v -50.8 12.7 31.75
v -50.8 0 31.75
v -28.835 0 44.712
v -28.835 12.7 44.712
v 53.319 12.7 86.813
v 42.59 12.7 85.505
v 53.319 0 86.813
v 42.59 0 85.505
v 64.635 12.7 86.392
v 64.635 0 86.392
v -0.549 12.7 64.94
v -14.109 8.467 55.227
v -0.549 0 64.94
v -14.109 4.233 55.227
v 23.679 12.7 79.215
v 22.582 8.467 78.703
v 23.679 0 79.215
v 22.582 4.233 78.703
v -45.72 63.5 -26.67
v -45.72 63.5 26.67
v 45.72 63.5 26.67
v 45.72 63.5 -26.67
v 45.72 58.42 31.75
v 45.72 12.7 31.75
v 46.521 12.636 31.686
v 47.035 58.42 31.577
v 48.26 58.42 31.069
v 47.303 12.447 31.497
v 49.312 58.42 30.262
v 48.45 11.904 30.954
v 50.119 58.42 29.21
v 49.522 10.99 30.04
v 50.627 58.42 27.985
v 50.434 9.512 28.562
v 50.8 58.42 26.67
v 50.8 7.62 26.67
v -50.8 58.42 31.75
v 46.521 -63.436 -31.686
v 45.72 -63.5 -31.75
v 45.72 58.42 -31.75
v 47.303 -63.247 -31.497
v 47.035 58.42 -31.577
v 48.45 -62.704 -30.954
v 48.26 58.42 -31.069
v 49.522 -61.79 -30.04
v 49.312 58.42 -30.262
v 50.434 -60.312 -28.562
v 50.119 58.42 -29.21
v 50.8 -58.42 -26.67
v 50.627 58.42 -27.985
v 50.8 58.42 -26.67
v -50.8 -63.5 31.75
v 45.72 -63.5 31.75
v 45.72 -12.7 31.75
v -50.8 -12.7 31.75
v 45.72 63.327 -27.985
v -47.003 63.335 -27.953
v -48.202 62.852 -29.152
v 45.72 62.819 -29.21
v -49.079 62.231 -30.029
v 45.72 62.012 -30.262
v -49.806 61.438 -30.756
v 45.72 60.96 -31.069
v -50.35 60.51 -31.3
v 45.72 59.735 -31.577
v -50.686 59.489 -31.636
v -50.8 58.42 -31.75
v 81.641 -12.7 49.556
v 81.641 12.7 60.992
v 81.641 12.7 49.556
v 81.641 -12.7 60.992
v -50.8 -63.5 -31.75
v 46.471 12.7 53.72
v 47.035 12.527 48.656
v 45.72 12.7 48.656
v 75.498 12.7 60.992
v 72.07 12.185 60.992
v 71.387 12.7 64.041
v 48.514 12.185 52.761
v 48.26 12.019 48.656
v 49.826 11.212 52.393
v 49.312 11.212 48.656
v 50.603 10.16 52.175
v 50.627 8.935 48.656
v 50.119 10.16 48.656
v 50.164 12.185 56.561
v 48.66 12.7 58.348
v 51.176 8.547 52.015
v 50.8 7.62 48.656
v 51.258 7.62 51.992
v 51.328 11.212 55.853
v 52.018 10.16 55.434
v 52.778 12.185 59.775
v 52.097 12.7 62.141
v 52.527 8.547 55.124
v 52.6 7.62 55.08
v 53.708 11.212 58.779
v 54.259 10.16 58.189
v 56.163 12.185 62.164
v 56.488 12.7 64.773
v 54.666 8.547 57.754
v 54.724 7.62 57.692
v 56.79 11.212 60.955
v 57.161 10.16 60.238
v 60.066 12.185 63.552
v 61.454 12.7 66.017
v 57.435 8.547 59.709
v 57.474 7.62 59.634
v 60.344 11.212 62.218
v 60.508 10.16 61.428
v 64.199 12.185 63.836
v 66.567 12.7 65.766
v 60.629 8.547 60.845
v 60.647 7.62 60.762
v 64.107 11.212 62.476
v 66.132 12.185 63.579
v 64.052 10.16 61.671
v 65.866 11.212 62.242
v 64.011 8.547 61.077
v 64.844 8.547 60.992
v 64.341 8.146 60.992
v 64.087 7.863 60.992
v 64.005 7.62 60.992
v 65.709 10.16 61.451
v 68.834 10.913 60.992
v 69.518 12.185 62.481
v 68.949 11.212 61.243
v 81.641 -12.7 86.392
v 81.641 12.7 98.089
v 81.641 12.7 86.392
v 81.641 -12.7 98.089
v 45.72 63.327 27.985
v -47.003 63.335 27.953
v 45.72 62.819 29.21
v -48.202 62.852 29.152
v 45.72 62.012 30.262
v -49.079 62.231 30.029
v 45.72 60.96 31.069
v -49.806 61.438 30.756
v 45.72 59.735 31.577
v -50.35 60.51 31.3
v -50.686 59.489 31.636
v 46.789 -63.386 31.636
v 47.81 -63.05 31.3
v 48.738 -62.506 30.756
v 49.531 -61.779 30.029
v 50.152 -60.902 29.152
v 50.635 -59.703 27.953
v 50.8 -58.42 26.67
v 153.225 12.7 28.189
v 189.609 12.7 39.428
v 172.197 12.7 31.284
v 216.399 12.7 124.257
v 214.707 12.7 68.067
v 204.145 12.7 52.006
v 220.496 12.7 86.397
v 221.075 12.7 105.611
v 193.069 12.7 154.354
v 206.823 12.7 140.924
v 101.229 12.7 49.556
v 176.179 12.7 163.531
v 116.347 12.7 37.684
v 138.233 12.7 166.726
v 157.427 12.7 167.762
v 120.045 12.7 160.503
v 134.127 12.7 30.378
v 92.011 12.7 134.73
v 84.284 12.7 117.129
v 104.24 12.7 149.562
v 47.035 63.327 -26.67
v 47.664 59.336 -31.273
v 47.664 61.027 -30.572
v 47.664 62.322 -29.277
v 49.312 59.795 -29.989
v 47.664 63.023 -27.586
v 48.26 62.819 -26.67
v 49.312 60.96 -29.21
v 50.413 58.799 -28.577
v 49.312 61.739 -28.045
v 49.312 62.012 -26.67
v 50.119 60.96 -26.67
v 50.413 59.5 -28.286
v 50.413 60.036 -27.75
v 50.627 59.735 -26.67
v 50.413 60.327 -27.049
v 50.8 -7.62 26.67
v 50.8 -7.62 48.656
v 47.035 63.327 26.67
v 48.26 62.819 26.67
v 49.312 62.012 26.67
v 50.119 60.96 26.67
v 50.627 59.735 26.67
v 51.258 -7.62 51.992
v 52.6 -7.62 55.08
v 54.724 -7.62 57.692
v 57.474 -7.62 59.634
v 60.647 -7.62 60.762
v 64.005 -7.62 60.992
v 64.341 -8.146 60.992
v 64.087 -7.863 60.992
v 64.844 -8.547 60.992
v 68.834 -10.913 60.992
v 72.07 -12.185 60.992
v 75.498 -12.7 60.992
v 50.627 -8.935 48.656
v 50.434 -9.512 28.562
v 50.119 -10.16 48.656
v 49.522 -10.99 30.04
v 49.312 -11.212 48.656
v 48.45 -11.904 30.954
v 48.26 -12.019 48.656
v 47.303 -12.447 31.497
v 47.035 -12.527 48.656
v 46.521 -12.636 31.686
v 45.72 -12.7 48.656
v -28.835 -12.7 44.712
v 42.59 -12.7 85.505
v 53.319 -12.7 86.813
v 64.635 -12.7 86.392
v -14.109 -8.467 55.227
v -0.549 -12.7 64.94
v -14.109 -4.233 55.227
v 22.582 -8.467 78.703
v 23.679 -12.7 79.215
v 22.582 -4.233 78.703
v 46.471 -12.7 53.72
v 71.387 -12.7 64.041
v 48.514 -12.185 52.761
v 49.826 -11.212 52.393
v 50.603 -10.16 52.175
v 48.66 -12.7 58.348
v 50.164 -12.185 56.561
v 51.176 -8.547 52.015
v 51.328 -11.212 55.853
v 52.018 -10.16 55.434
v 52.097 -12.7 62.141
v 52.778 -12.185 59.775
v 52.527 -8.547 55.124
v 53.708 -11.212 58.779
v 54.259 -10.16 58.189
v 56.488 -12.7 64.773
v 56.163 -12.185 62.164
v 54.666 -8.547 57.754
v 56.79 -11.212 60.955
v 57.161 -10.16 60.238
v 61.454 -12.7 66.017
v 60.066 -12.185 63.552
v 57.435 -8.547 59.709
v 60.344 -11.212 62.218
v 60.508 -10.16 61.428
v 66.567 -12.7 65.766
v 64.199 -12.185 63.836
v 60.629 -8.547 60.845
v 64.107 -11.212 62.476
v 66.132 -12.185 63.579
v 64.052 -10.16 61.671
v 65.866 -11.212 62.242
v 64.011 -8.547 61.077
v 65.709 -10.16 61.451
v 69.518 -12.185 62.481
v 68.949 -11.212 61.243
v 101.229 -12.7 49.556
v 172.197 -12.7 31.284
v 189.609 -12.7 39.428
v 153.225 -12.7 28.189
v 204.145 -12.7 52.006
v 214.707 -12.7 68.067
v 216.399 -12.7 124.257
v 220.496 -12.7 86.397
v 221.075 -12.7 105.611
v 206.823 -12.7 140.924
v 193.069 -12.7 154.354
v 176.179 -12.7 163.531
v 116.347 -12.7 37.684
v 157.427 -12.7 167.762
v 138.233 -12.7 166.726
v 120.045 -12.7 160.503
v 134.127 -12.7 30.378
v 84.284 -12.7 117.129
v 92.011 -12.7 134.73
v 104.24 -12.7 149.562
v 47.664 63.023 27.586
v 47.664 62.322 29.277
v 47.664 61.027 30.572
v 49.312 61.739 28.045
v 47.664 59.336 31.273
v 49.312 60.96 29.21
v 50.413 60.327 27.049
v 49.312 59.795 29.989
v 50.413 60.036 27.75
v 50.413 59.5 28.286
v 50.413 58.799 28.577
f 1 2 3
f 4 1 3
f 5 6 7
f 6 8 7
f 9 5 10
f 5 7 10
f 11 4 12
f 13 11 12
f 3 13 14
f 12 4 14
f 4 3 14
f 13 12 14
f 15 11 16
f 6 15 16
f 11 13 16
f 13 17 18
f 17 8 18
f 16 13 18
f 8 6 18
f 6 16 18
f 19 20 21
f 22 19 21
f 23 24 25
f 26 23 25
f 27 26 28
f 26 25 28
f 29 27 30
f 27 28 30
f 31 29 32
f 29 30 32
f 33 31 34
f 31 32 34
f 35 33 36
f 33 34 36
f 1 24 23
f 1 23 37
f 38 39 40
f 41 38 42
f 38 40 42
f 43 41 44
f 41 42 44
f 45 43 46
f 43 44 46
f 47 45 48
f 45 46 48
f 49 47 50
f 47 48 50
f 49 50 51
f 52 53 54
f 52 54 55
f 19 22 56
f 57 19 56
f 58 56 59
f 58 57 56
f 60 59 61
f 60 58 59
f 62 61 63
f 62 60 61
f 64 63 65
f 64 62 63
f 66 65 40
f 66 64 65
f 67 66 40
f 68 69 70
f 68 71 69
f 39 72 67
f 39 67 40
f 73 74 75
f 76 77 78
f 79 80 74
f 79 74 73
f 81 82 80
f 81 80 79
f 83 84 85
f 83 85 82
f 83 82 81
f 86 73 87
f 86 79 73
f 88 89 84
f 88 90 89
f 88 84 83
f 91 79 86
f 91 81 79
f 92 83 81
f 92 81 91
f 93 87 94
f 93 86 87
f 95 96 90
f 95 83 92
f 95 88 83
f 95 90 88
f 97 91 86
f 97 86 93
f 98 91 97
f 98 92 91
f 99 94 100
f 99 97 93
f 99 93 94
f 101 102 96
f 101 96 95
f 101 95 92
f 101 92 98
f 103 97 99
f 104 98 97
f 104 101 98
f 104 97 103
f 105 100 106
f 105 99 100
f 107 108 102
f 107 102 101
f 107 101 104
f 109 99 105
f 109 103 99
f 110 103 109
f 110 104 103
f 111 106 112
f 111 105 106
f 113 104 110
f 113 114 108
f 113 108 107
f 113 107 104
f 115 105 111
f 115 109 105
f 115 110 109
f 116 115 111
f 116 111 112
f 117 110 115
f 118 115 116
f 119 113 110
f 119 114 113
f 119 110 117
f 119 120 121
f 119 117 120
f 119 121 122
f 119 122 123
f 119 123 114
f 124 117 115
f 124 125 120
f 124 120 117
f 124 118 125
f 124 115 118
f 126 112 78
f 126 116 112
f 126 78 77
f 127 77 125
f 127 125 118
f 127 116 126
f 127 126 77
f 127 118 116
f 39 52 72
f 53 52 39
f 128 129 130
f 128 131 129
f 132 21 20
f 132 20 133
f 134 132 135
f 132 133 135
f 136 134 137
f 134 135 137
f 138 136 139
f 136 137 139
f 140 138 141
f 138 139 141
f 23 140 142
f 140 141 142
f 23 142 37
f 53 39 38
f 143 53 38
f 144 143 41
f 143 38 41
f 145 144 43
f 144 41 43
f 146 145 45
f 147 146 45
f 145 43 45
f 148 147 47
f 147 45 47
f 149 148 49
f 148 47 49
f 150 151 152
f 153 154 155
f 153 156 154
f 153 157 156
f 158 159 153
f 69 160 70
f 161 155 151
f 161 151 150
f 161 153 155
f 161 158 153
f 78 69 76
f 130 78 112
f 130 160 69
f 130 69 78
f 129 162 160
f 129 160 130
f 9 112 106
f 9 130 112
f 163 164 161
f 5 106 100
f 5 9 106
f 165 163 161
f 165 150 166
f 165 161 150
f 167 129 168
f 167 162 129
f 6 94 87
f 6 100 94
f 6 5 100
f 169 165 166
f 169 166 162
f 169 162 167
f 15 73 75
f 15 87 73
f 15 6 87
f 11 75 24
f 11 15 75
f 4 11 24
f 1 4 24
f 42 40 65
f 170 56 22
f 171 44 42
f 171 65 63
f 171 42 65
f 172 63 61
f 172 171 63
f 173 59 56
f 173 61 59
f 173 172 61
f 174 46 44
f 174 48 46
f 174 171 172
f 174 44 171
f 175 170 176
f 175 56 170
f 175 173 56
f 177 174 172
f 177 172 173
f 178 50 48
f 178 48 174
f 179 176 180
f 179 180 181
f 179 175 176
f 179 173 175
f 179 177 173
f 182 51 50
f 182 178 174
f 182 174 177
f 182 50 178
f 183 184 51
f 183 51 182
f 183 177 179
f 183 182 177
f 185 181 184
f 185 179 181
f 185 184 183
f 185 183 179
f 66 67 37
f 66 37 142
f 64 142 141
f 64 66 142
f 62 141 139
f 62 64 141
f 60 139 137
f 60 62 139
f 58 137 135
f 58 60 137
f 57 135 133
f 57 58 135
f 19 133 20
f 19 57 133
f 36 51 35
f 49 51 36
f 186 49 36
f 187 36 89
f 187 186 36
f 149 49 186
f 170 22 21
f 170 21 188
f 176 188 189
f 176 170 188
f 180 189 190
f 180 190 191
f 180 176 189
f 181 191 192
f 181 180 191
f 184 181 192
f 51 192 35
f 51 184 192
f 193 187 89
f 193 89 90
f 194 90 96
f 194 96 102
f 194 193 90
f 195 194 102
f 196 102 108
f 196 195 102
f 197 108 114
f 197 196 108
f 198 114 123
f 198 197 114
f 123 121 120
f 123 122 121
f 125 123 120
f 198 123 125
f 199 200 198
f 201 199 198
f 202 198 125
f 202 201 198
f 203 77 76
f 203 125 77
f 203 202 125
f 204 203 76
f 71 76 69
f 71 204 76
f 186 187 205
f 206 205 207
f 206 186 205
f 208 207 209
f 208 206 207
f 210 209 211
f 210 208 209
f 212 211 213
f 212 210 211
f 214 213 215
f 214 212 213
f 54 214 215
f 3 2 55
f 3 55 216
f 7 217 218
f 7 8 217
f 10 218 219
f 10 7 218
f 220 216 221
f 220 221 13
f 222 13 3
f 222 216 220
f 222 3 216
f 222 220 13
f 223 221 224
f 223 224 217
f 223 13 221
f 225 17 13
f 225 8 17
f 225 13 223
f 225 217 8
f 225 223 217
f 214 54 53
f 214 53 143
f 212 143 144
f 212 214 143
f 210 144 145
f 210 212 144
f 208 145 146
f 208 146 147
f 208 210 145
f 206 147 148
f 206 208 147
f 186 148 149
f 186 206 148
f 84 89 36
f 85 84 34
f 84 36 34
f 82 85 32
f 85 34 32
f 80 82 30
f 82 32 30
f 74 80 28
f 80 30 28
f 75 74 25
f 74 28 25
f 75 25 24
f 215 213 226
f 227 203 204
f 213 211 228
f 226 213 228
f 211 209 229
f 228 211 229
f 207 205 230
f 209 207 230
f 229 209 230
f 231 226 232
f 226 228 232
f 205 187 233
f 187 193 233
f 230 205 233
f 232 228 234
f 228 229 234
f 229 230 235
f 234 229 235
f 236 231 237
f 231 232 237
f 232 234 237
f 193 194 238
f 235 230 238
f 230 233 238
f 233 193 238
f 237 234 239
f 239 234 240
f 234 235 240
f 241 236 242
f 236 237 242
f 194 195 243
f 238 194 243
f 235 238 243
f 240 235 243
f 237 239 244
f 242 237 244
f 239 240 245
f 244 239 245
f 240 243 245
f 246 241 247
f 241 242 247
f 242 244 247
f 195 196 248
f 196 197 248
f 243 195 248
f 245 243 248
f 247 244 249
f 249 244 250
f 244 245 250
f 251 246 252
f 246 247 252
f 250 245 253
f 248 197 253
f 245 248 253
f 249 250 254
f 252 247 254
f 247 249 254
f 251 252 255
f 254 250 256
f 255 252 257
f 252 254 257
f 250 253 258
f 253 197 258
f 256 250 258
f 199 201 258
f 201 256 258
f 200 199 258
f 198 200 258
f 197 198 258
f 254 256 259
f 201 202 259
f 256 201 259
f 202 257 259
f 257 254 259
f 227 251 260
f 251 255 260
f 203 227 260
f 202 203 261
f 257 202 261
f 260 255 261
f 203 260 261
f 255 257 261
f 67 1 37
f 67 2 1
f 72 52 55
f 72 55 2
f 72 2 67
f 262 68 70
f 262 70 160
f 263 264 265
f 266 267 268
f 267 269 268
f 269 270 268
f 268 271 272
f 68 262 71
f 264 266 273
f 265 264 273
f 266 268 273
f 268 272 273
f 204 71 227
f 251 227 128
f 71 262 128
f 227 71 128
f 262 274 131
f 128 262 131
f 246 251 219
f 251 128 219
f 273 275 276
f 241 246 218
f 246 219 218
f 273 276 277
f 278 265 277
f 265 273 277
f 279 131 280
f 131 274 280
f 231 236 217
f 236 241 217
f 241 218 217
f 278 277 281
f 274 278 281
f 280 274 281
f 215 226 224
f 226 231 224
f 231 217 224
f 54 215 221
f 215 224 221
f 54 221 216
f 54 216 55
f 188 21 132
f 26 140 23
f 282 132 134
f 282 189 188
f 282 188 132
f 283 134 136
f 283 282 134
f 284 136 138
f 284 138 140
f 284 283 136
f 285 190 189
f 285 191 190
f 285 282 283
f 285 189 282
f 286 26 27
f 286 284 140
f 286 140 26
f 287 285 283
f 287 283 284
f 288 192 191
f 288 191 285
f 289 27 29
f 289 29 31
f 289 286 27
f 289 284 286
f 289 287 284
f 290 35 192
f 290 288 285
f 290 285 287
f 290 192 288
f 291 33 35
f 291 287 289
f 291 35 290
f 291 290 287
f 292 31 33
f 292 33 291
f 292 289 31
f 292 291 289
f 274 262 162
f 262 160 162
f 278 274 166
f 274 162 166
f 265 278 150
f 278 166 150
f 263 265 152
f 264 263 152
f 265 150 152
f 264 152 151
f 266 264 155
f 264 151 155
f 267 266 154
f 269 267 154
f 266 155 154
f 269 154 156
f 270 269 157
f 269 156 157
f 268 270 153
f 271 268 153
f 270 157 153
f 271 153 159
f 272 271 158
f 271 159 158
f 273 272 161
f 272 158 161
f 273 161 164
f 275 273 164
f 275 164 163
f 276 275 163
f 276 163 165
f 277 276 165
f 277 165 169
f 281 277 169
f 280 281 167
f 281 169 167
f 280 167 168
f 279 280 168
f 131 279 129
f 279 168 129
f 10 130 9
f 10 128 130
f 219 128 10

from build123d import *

# Parameters (mm, degrees)
F1_DEPTH     = 63.5
F2_DEPTH     = 12.7
F2_FACE_W    = 69.919578209
F2_FACE_H    = 25.4
F4_T1_DEPTH  = 134.62
F4_T3_DEPTH  = 53.34
F4_T5_DEPTH  = 45.72
F4_T7_DEPTH  = 16.9064607487
F4_T9_DEPTH  = 63.5
F4_T11_DEPTH = 88.9
F4_T13_DEPTH = 109.22
F4_S17_W     = 5.08
F4_S17_H     = 5.08
F4_T18_DEPTH = 5.08
F4_S23_W     = 5.08
F4_S23_H     = 5.08
F4_T24_DEPTH = 5.08
F4_T28_ANGLE = 152.7793054157
F4_T30_ANGLE = 152.7793054157
F4_T35_DEPTH = 58.42
F4_T39_DEPTH = 29.6064607487
F4_T46_DEPTH = 76.2
F4_T50_DEPTH = 29.6064607487


# Not quite as in the source:
# - a fillet or chamfer that OpenCascade refuses, or shapes differently, is made with other operations: its cross-section is extruded or revolved along the edge and cut away or added


with BuildPart() as f1:
    # F0 (on Front) → F1 (new body, symmetric)
    with BuildSketch(Plane.XZ):
        Polygon((-50.8, 31.75), (-50.8, -31.75), (50.8, -31.75), (50.8, 31.75), (25.4, 31.75), align=None)
    extrude(amount=F1_DEPTH, both=True)

    # F0 (on Front) → F2 (join, symmetric)
    with BuildSketch(Plane.XZ):
        with BuildLine():
            add(Edge.make_bspline(
                [(-50.8, 31.75), (-12.3217052749, 49.9639766453), (18.113411963, 91.8597280979), (64.6348841752, 86.3919299359)],
                knots=[0, 0, 0, 0, 127.7143413704, 127.7143413704, 127.7143413704, 127.7143413704], degree=3))
            Line((-50.8, 31.75), (25.4, 31.75))
            Line((25.4, 31.75), (25.4, 48.6564607487))
            ThreePointArc((25.4, 48.6564607487), (36.9860122893, 75.8747531778), (64.6348841752, 86.3919299359))
        make_face()
        with BuildLine():
            Line((25.4, 31.75), (50.8, 31.75))
            Line((50.8, 31.75), (50.8, 48.6564607487))
            ThreePointArc((50.8, 48.6564607487), (54.7240260068, 57.691740436), (64.0053517954, 60.9919299359))
            Line((64.0053517954, 60.9919299359), (81.6413929723, 60.9919299359))
            Line((81.6413929723, 60.9919299359), (81.6413929723, 86.3919299359))
            Line((81.6413929723, 86.3919299359), (64.6348841752, 86.3919299359))
            ThreePointArc((64.6348841752, 86.3919299359), (36.9860122893, 75.8747531778), (25.4, 48.6564607487))
            Line((25.4, 48.6564607487), (25.4, 31.75))
        make_face()
        Polygon((81.6413929723, 98.0887729745), (81.6413929723, 86.3919299359), (81.6413929723, 60.9919299359), (81.6413929723, 49.5563661095), (151.5609711813, 49.5563661095), (151.5609711813, 98.0887729745), align=None)
    extrude(amount=F2_DEPTH, both=True)

    # F2_face (on face) → F3 (revolve)
    with BuildSketch(Plane(origin=(116.6011820768, 0, 98.0887729745), x_dir=(1, 0, 0), z_dir=(0, 0, 1))):
        Rectangle(F2_FACE_W, F2_FACE_H)
    revolve(axis=Axis((151.5609711813, 0, 98.0887729745), (0, -1, 0)))

    # F4: fillet of radius 5.08 on 13 edges, made by hand

    # F4_s2 → F4_t1 (cut)
    with BuildSketch(Plane.XZ.offset(-58.42)):
        with BuildLine():
            ThreePointArc((45.72, -31.75), (49.3121024484, -30.2621024484), (50.8, -26.67))
            Line((50.8, -26.67), (50.8, -31.75))
            Line((50.8, -31.75), (45.72, -31.75))
        make_face()
    extrude(amount=F4_T1_DEPTH, mode=Mode.SUBTRACT)

    # F4_s4 → F4_t3 (cut)
    with BuildSketch(Plane.XY.offset(-26.67)):
        with BuildLine():
            ThreePointArc((45.72, 63.5), (49.3121024484, 62.0121024484), (50.8, 58.42))
            Line((50.8, 58.42), (50.8, 63.5))
            Line((50.8, 63.5), (45.72, 63.5))
        make_face()
    extrude(amount=F4_T3_DEPTH, mode=Mode.SUBTRACT)

    # F4_s6 → F4_t5 (cut)
    with BuildSketch(Plane.XZ.offset(-58.42)):
        with BuildLine():
            ThreePointArc((45.72, 31.75), (49.3121024484, 30.2621024484), (50.8, 26.67))
            Line((50.8, 26.67), (50.8, 31.75))
            Line((50.8, 31.75), (45.72, 31.75))
        make_face()
    extrude(amount=F4_T5_DEPTH, mode=Mode.SUBTRACT)

    # F4_s8 → F4_t7 (cut)
    with BuildSketch(Plane.XY.offset(31.75)):
        with BuildLine():
            ThreePointArc((50.8, 7.62), (49.3121024484, 11.2121024484), (45.72, 12.7))
            Line((45.72, 12.7), (50.8, 12.7))
            Line((50.8, 12.7), (50.8, 7.62))
        make_face()
        with BuildLine():
            ThreePointArc((50.8, -7.62), (49.3121024484, -11.2121024484), (45.72, -12.7))
            Line((45.72, -12.7), (50.8, -12.7))
            Line((50.8, -12.7), (50.8, -7.62))
        make_face()
    extrude(amount=F4_T7_DEPTH, mode=Mode.SUBTRACT)

    # F4_s10 → F4_t9 (cut)
    with BuildSketch(Plane.XZ.offset(12.7)):
        with BuildLine():
            ThreePointArc((45.72, 31.75), (49.3121024484, 30.2621024484), (50.8, 26.67))
            Line((50.8, 26.67), (50.8, 31.75))
            Line((50.8, 31.75), (45.72, 31.75))
        make_face()
    extrude(amount=F4_T9_DEPTH, mode=Mode.SUBTRACT)

    # F4_s12 → F4_t11 (cut)
    with BuildSketch(Plane.XY.offset(-44.45)):
        with BuildLine():
            ThreePointArc((45.72, -63.5), (49.3121024484, -62.0121024484), (50.8, -58.42))
            Line((50.8, -58.42), (50.8, -63.5))
            Line((50.8, -63.5), (45.72, -63.5))
        make_face()
        with BuildLine():
            ThreePointArc((-50.8, 58.42), (-49.3121024484, 62.0121024484), (-45.72, 63.5))
            Line((-45.72, 63.5), (-50.8, 63.5))
            Line((-50.8, 63.5), (-50.8, 58.42))
        make_face()
    extrude(amount=F4_T11_DEPTH, mode=Mode.SUBTRACT)

    # F4_s14 → F4_t13 (cut)
    with BuildSketch(Plane.YZ.offset(-63.5)):
        with BuildLine():
            ThreePointArc((63.5, -26.67), (62.0121024484, -30.2621024484), (58.42, -31.75))
            Line((58.42, -31.75), (63.5, -31.75))
            Line((63.5, -31.75), (63.5, -26.67))
        make_face()
        with BuildLine():
            ThreePointArc((63.5, 26.67), (62.0121024484, 30.2621024484), (58.42, 31.75))
            Line((58.42, 31.75), (63.5, 31.75))
            Line((63.5, 31.75), (63.5, 26.67))
        make_face()
    extrude(amount=F4_T13_DEPTH, mode=Mode.SUBTRACT)


with BuildPart() as f4_tool16:
    # F4_s17 → F4_t18 (new body)
    with BuildSketch(Plane.YZ.offset(45.72)):
        with Locations((60.96, -29.21)):
            Rectangle(F4_S17_W, F4_S17_H)
    extrude(amount=F4_T18_DEPTH)

    # F4_s19 → F4_t20 (revolve, cut)
    with BuildSketch(Plane(origin=(45.72, 58.42, -26.67), x_dir=(0, -0.7071067812, 0.7071067812), z_dir=(0, 0.7071067812, 0.7071067812))):
        with BuildLine():
            ThreePointArc((0, -5.08), (5.08, 0), (0, 5.08))
            Line((0, 5.08), (0, -5.08))
        make_face()
    revolve(axis=Axis((45.72, 58.42, -26.67), (1, 0, 0)), mode=Mode.SUBTRACT)


with BuildPart() as f1_1:
    add(f1.part)

    # F4_t15: cut F4_tool16
    add(f4_tool16.part, mode=Mode.SUBTRACT)


with BuildPart() as f4_tool22:
    # F4_s23 → F4_t24 (new body)
    with BuildSketch(Plane.YZ.offset(45.72)):
        with Locations((60.96, 29.21)):
            Rectangle(F4_S23_W, F4_S23_H)
    extrude(amount=F4_T24_DEPTH)

    # F4_s25 → F4_t26 (revolve, cut)
    with BuildSketch(Plane(origin=(45.72, 58.42, 26.67), x_dir=(0, -0.7071067812, -0.7071067812), z_dir=(0, -0.7071067812, 0.7071067812))):
        with BuildLine():
            ThreePointArc((0, -5.08), (5.08, 0), (0, 5.08))
            Line((0, 5.08), (0, -5.08))
        make_face()
    revolve(axis=Axis((45.72, 58.42, 26.67), (1, 0, 0)), mode=Mode.SUBTRACT)


with BuildPart() as f1_2:
    add(f1_1.part)

    # F4_t21: cut F4_tool22
    add(f4_tool22.part, mode=Mode.SUBTRACT)

    # F4_s27 → F4_t28 (revolve, cut)
    with BuildSketch(Plane.XY.offset(48.6564607487)):
        with BuildLine():
            ThreePointArc((45.72, -12.7), (49.3121024484, -11.2121024484), (50.8, -7.62))
            Line((50.8, -7.62), (50.8, -12.7))
            Line((50.8, -12.7), (45.72, -12.7))
        make_face()
    revolve(axis=Axis((63.1641202888, -12.7, 48.6564607487), (0, 1, 0)), revolution_arc=F4_T28_ANGLE, mode=Mode.SUBTRACT)

    # F4_s29 → F4_t30 (revolve, cut)
    with BuildSketch(Plane.XY.offset(48.6564607487)):
        with BuildLine():
            ThreePointArc((45.72, 12.7), (49.3121024484, 11.2121024484), (50.8, 7.62))
            Line((50.8, 7.62), (50.8, 12.7))
            Line((50.8, 12.7), (45.72, 12.7))
        make_face()
    revolve(axis=Axis((63.1641202888, 12.7, 48.6564607487), (0, 1, 0)), revolution_arc=F4_T30_ANGLE, mode=Mode.SUBTRACT)


with BuildPart() as f4_tool33:
    # F4_s34 → F4_t35 (new body)
    with BuildSketch(Plane.XZ):
        with BuildLine():
            ThreePointArc((45.72, 31.75), (49.3121024484, 30.2621024484), (50.8, 26.67))
            Line((50.8, 26.67), (50.8, 31.75))
            Line((50.8, 31.75), (45.72, 31.75))
        make_face()
    extrude(amount=-F4_T35_DEPTH)

    split(bisect_by=Plane.XZ.offset(-12.7), keep=Keep.TOP)


with BuildPart() as f4_tool37:
    # F4_s38 → F4_t39 (new body)
    with BuildSketch(Plane.XY.offset(19.05)):
        with BuildLine():
            ThreePointArc((50.8, 7.62), (49.3121024484, 11.2121024484), (45.72, 12.7))
            Line((45.72, 12.7), (50.8, 12.7))
            Line((50.8, 12.7), (50.8, 7.62))
        make_face()
    extrude(amount=F4_T39_DEPTH)

    split(bisect_by=Plane.XY.offset(31.75), keep=Keep.BOTTOM)


with BuildPart() as f4_tool33_1:
    add(f4_tool33.part)

    # F4_t41: intersect F4_tool37
    add(f4_tool37.part, mode=Mode.INTERSECT)


with BuildPart() as f1_3:
    add(f1_2.part)

    # F4_t31: cut F4_tool33
    add(f4_tool33_1.part, mode=Mode.SUBTRACT)


with BuildPart() as f4_tool44:
    # F4_s45 → F4_t46 (new body)
    with BuildSketch(Plane.XZ.offset(76.2)):
        with BuildLine():
            ThreePointArc((45.72, 31.75), (49.3121024484, 30.2621024484), (50.8, 26.67))
            Line((50.8, 26.67), (50.8, 31.75))
            Line((50.8, 31.75), (45.72, 31.75))
        make_face()
    extrude(amount=-F4_T46_DEPTH)

    split(bisect_by=Plane.XZ.offset(12.7), keep=Keep.BOTTOM)


with BuildPart() as f4_tool48:
    # F4_s49 → F4_t50 (new body)
    with BuildSketch(Plane.XY.offset(19.05)):
        with BuildLine():
            ThreePointArc((50.8, -7.62), (49.3121024484, -11.2121024484), (45.72, -12.7))
            Line((45.72, -12.7), (50.8, -12.7))
            Line((50.8, -12.7), (50.8, -7.62))
        make_face()
    extrude(amount=F4_T50_DEPTH)

    split(bisect_by=Plane.XY.offset(31.75), keep=Keep.BOTTOM)


with BuildPart() as f4_tool44_1:
    add(f4_tool44.part)

    # F4_t52: intersect F4_tool48
    add(f4_tool48.part, mode=Mode.INTERSECT)


with BuildPart() as f1_4:
    add(f1_3.part)

    # F4_t42: cut F4_tool44
    add(f4_tool44_1.part, mode=Mode.SUBTRACT)


solid = f1_4.part
